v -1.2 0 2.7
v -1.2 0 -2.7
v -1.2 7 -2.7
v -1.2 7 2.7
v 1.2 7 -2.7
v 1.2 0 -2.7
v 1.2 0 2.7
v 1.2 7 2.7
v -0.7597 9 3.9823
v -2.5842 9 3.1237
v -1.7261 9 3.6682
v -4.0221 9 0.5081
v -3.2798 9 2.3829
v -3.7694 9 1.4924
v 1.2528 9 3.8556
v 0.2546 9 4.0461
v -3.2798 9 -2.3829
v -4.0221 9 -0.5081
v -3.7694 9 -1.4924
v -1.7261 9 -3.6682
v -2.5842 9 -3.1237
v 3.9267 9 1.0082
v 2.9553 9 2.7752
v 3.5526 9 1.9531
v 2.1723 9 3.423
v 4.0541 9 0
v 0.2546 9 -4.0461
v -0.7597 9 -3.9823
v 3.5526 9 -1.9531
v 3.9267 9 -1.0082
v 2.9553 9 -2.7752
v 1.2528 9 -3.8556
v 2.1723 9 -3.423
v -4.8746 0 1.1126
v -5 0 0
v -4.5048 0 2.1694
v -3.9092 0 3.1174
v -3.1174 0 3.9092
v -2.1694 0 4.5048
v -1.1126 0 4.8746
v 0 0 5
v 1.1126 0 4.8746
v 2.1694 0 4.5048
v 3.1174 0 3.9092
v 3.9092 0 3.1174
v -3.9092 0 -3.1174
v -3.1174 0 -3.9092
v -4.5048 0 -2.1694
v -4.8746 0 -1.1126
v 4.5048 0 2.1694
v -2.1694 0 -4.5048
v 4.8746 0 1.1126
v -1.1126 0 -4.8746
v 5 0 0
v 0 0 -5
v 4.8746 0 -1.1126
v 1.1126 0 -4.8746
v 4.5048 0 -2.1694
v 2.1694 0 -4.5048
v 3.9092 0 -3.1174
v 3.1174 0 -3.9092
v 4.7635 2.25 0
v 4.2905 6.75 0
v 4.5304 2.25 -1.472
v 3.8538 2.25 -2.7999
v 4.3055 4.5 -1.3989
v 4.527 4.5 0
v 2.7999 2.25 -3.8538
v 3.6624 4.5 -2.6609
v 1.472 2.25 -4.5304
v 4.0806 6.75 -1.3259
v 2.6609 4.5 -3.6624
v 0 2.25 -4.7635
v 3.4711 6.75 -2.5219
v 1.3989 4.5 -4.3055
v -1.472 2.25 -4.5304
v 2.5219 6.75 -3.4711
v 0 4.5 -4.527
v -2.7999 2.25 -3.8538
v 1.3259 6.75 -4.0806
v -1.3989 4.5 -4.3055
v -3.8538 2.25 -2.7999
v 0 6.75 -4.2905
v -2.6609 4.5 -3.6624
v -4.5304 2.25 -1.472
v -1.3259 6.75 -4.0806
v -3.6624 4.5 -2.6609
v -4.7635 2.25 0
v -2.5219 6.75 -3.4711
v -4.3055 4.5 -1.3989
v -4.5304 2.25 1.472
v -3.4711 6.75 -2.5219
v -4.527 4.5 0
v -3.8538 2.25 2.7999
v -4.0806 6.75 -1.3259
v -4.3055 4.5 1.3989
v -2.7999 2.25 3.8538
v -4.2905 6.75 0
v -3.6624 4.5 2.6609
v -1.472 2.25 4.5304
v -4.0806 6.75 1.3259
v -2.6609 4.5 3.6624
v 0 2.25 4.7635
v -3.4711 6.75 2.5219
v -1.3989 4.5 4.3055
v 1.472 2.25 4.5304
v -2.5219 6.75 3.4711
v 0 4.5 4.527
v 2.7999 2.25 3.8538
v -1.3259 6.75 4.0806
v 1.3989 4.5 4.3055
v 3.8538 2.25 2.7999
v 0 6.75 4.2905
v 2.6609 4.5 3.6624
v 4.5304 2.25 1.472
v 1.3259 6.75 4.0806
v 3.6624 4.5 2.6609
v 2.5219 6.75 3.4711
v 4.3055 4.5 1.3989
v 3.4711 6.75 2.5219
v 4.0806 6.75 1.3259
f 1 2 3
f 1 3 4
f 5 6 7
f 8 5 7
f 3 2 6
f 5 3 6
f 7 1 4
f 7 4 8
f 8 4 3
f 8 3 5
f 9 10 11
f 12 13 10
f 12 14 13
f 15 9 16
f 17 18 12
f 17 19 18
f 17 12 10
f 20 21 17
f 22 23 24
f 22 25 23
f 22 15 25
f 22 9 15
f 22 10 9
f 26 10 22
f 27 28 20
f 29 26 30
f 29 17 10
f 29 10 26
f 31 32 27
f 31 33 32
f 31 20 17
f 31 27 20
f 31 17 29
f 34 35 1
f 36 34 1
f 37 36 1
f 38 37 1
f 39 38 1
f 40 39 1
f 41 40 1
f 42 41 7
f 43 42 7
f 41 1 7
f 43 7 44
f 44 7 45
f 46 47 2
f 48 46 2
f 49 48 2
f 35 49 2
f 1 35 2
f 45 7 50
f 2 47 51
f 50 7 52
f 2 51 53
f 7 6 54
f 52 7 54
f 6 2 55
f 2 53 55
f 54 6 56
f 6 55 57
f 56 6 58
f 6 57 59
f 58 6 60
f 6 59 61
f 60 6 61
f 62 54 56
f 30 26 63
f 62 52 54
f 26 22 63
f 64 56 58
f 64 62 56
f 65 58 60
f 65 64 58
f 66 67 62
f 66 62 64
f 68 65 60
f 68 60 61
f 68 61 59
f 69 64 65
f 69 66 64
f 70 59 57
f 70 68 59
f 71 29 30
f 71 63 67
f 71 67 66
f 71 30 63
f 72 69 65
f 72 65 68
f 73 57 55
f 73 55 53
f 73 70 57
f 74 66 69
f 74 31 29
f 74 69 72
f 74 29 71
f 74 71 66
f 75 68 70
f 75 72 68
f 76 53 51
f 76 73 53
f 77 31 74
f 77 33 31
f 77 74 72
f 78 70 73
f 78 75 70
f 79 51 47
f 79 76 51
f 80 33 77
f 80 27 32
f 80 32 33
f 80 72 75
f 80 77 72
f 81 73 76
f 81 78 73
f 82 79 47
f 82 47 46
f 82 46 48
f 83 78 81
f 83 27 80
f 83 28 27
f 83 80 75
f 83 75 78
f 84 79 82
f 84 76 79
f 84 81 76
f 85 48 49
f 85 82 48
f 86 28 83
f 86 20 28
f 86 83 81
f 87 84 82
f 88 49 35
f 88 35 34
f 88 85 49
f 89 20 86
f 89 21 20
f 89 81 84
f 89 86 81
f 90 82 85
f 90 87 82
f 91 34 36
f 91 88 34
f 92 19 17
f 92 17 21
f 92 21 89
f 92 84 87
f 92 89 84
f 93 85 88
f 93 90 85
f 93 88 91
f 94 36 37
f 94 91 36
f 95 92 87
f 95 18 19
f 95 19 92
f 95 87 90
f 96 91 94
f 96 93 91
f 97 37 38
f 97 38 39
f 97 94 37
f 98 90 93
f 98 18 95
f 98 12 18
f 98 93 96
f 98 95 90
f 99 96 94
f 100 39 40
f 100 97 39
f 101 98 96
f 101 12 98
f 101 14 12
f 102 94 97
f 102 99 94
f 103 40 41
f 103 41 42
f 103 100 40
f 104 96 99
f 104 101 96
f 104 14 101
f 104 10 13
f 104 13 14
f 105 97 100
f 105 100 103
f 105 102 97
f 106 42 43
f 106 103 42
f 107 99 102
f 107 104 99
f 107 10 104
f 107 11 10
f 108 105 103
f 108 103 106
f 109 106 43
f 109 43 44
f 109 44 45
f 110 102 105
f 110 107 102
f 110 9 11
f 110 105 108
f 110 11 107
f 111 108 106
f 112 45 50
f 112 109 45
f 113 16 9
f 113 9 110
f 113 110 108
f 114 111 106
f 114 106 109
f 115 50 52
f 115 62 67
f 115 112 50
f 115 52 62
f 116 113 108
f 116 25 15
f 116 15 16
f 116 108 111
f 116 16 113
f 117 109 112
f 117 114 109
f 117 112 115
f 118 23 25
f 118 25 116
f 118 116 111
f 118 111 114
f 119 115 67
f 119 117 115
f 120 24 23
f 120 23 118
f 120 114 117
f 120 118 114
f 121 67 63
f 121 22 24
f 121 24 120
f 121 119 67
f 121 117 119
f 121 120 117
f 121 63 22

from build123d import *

# Parameters (mm, degrees)
ESQUISSE2_R             = 5
BOSS_EXTRU_1_DEPTH      = 9
BOSS_EXTRU_1_TAPER      = 6
ESQUISSE3_W             = 2.4
ESQUISSE3_H             = 5.4
ENL_V_MAT_EXTRU_1_DEPTH = 7


with BuildPart() as part:
    # Esquisse2 → Boss.-Extru.1 (new body)
    with BuildSketch(Plane(origin=(0, 0, 0), x_dir=(1, 0, 0), z_dir=(0, 1, 0))):
        Circle(ESQUISSE2_R)
    extrude(amount=BOSS_EXTRU_1_DEPTH, taper=BOSS_EXTRU_1_TAPER)

    # Esquisse3 → Enlèv. mat.-Extru.1 (cut)
    with BuildSketch(Plane.XZ):
        Rectangle(ESQUISSE3_W, ESQUISSE3_H)
    extrude(amount=-ENL_V_MAT_EXTRU_1_DEPTH, mode=Mode.SUBTRACT)


solid = part.part
